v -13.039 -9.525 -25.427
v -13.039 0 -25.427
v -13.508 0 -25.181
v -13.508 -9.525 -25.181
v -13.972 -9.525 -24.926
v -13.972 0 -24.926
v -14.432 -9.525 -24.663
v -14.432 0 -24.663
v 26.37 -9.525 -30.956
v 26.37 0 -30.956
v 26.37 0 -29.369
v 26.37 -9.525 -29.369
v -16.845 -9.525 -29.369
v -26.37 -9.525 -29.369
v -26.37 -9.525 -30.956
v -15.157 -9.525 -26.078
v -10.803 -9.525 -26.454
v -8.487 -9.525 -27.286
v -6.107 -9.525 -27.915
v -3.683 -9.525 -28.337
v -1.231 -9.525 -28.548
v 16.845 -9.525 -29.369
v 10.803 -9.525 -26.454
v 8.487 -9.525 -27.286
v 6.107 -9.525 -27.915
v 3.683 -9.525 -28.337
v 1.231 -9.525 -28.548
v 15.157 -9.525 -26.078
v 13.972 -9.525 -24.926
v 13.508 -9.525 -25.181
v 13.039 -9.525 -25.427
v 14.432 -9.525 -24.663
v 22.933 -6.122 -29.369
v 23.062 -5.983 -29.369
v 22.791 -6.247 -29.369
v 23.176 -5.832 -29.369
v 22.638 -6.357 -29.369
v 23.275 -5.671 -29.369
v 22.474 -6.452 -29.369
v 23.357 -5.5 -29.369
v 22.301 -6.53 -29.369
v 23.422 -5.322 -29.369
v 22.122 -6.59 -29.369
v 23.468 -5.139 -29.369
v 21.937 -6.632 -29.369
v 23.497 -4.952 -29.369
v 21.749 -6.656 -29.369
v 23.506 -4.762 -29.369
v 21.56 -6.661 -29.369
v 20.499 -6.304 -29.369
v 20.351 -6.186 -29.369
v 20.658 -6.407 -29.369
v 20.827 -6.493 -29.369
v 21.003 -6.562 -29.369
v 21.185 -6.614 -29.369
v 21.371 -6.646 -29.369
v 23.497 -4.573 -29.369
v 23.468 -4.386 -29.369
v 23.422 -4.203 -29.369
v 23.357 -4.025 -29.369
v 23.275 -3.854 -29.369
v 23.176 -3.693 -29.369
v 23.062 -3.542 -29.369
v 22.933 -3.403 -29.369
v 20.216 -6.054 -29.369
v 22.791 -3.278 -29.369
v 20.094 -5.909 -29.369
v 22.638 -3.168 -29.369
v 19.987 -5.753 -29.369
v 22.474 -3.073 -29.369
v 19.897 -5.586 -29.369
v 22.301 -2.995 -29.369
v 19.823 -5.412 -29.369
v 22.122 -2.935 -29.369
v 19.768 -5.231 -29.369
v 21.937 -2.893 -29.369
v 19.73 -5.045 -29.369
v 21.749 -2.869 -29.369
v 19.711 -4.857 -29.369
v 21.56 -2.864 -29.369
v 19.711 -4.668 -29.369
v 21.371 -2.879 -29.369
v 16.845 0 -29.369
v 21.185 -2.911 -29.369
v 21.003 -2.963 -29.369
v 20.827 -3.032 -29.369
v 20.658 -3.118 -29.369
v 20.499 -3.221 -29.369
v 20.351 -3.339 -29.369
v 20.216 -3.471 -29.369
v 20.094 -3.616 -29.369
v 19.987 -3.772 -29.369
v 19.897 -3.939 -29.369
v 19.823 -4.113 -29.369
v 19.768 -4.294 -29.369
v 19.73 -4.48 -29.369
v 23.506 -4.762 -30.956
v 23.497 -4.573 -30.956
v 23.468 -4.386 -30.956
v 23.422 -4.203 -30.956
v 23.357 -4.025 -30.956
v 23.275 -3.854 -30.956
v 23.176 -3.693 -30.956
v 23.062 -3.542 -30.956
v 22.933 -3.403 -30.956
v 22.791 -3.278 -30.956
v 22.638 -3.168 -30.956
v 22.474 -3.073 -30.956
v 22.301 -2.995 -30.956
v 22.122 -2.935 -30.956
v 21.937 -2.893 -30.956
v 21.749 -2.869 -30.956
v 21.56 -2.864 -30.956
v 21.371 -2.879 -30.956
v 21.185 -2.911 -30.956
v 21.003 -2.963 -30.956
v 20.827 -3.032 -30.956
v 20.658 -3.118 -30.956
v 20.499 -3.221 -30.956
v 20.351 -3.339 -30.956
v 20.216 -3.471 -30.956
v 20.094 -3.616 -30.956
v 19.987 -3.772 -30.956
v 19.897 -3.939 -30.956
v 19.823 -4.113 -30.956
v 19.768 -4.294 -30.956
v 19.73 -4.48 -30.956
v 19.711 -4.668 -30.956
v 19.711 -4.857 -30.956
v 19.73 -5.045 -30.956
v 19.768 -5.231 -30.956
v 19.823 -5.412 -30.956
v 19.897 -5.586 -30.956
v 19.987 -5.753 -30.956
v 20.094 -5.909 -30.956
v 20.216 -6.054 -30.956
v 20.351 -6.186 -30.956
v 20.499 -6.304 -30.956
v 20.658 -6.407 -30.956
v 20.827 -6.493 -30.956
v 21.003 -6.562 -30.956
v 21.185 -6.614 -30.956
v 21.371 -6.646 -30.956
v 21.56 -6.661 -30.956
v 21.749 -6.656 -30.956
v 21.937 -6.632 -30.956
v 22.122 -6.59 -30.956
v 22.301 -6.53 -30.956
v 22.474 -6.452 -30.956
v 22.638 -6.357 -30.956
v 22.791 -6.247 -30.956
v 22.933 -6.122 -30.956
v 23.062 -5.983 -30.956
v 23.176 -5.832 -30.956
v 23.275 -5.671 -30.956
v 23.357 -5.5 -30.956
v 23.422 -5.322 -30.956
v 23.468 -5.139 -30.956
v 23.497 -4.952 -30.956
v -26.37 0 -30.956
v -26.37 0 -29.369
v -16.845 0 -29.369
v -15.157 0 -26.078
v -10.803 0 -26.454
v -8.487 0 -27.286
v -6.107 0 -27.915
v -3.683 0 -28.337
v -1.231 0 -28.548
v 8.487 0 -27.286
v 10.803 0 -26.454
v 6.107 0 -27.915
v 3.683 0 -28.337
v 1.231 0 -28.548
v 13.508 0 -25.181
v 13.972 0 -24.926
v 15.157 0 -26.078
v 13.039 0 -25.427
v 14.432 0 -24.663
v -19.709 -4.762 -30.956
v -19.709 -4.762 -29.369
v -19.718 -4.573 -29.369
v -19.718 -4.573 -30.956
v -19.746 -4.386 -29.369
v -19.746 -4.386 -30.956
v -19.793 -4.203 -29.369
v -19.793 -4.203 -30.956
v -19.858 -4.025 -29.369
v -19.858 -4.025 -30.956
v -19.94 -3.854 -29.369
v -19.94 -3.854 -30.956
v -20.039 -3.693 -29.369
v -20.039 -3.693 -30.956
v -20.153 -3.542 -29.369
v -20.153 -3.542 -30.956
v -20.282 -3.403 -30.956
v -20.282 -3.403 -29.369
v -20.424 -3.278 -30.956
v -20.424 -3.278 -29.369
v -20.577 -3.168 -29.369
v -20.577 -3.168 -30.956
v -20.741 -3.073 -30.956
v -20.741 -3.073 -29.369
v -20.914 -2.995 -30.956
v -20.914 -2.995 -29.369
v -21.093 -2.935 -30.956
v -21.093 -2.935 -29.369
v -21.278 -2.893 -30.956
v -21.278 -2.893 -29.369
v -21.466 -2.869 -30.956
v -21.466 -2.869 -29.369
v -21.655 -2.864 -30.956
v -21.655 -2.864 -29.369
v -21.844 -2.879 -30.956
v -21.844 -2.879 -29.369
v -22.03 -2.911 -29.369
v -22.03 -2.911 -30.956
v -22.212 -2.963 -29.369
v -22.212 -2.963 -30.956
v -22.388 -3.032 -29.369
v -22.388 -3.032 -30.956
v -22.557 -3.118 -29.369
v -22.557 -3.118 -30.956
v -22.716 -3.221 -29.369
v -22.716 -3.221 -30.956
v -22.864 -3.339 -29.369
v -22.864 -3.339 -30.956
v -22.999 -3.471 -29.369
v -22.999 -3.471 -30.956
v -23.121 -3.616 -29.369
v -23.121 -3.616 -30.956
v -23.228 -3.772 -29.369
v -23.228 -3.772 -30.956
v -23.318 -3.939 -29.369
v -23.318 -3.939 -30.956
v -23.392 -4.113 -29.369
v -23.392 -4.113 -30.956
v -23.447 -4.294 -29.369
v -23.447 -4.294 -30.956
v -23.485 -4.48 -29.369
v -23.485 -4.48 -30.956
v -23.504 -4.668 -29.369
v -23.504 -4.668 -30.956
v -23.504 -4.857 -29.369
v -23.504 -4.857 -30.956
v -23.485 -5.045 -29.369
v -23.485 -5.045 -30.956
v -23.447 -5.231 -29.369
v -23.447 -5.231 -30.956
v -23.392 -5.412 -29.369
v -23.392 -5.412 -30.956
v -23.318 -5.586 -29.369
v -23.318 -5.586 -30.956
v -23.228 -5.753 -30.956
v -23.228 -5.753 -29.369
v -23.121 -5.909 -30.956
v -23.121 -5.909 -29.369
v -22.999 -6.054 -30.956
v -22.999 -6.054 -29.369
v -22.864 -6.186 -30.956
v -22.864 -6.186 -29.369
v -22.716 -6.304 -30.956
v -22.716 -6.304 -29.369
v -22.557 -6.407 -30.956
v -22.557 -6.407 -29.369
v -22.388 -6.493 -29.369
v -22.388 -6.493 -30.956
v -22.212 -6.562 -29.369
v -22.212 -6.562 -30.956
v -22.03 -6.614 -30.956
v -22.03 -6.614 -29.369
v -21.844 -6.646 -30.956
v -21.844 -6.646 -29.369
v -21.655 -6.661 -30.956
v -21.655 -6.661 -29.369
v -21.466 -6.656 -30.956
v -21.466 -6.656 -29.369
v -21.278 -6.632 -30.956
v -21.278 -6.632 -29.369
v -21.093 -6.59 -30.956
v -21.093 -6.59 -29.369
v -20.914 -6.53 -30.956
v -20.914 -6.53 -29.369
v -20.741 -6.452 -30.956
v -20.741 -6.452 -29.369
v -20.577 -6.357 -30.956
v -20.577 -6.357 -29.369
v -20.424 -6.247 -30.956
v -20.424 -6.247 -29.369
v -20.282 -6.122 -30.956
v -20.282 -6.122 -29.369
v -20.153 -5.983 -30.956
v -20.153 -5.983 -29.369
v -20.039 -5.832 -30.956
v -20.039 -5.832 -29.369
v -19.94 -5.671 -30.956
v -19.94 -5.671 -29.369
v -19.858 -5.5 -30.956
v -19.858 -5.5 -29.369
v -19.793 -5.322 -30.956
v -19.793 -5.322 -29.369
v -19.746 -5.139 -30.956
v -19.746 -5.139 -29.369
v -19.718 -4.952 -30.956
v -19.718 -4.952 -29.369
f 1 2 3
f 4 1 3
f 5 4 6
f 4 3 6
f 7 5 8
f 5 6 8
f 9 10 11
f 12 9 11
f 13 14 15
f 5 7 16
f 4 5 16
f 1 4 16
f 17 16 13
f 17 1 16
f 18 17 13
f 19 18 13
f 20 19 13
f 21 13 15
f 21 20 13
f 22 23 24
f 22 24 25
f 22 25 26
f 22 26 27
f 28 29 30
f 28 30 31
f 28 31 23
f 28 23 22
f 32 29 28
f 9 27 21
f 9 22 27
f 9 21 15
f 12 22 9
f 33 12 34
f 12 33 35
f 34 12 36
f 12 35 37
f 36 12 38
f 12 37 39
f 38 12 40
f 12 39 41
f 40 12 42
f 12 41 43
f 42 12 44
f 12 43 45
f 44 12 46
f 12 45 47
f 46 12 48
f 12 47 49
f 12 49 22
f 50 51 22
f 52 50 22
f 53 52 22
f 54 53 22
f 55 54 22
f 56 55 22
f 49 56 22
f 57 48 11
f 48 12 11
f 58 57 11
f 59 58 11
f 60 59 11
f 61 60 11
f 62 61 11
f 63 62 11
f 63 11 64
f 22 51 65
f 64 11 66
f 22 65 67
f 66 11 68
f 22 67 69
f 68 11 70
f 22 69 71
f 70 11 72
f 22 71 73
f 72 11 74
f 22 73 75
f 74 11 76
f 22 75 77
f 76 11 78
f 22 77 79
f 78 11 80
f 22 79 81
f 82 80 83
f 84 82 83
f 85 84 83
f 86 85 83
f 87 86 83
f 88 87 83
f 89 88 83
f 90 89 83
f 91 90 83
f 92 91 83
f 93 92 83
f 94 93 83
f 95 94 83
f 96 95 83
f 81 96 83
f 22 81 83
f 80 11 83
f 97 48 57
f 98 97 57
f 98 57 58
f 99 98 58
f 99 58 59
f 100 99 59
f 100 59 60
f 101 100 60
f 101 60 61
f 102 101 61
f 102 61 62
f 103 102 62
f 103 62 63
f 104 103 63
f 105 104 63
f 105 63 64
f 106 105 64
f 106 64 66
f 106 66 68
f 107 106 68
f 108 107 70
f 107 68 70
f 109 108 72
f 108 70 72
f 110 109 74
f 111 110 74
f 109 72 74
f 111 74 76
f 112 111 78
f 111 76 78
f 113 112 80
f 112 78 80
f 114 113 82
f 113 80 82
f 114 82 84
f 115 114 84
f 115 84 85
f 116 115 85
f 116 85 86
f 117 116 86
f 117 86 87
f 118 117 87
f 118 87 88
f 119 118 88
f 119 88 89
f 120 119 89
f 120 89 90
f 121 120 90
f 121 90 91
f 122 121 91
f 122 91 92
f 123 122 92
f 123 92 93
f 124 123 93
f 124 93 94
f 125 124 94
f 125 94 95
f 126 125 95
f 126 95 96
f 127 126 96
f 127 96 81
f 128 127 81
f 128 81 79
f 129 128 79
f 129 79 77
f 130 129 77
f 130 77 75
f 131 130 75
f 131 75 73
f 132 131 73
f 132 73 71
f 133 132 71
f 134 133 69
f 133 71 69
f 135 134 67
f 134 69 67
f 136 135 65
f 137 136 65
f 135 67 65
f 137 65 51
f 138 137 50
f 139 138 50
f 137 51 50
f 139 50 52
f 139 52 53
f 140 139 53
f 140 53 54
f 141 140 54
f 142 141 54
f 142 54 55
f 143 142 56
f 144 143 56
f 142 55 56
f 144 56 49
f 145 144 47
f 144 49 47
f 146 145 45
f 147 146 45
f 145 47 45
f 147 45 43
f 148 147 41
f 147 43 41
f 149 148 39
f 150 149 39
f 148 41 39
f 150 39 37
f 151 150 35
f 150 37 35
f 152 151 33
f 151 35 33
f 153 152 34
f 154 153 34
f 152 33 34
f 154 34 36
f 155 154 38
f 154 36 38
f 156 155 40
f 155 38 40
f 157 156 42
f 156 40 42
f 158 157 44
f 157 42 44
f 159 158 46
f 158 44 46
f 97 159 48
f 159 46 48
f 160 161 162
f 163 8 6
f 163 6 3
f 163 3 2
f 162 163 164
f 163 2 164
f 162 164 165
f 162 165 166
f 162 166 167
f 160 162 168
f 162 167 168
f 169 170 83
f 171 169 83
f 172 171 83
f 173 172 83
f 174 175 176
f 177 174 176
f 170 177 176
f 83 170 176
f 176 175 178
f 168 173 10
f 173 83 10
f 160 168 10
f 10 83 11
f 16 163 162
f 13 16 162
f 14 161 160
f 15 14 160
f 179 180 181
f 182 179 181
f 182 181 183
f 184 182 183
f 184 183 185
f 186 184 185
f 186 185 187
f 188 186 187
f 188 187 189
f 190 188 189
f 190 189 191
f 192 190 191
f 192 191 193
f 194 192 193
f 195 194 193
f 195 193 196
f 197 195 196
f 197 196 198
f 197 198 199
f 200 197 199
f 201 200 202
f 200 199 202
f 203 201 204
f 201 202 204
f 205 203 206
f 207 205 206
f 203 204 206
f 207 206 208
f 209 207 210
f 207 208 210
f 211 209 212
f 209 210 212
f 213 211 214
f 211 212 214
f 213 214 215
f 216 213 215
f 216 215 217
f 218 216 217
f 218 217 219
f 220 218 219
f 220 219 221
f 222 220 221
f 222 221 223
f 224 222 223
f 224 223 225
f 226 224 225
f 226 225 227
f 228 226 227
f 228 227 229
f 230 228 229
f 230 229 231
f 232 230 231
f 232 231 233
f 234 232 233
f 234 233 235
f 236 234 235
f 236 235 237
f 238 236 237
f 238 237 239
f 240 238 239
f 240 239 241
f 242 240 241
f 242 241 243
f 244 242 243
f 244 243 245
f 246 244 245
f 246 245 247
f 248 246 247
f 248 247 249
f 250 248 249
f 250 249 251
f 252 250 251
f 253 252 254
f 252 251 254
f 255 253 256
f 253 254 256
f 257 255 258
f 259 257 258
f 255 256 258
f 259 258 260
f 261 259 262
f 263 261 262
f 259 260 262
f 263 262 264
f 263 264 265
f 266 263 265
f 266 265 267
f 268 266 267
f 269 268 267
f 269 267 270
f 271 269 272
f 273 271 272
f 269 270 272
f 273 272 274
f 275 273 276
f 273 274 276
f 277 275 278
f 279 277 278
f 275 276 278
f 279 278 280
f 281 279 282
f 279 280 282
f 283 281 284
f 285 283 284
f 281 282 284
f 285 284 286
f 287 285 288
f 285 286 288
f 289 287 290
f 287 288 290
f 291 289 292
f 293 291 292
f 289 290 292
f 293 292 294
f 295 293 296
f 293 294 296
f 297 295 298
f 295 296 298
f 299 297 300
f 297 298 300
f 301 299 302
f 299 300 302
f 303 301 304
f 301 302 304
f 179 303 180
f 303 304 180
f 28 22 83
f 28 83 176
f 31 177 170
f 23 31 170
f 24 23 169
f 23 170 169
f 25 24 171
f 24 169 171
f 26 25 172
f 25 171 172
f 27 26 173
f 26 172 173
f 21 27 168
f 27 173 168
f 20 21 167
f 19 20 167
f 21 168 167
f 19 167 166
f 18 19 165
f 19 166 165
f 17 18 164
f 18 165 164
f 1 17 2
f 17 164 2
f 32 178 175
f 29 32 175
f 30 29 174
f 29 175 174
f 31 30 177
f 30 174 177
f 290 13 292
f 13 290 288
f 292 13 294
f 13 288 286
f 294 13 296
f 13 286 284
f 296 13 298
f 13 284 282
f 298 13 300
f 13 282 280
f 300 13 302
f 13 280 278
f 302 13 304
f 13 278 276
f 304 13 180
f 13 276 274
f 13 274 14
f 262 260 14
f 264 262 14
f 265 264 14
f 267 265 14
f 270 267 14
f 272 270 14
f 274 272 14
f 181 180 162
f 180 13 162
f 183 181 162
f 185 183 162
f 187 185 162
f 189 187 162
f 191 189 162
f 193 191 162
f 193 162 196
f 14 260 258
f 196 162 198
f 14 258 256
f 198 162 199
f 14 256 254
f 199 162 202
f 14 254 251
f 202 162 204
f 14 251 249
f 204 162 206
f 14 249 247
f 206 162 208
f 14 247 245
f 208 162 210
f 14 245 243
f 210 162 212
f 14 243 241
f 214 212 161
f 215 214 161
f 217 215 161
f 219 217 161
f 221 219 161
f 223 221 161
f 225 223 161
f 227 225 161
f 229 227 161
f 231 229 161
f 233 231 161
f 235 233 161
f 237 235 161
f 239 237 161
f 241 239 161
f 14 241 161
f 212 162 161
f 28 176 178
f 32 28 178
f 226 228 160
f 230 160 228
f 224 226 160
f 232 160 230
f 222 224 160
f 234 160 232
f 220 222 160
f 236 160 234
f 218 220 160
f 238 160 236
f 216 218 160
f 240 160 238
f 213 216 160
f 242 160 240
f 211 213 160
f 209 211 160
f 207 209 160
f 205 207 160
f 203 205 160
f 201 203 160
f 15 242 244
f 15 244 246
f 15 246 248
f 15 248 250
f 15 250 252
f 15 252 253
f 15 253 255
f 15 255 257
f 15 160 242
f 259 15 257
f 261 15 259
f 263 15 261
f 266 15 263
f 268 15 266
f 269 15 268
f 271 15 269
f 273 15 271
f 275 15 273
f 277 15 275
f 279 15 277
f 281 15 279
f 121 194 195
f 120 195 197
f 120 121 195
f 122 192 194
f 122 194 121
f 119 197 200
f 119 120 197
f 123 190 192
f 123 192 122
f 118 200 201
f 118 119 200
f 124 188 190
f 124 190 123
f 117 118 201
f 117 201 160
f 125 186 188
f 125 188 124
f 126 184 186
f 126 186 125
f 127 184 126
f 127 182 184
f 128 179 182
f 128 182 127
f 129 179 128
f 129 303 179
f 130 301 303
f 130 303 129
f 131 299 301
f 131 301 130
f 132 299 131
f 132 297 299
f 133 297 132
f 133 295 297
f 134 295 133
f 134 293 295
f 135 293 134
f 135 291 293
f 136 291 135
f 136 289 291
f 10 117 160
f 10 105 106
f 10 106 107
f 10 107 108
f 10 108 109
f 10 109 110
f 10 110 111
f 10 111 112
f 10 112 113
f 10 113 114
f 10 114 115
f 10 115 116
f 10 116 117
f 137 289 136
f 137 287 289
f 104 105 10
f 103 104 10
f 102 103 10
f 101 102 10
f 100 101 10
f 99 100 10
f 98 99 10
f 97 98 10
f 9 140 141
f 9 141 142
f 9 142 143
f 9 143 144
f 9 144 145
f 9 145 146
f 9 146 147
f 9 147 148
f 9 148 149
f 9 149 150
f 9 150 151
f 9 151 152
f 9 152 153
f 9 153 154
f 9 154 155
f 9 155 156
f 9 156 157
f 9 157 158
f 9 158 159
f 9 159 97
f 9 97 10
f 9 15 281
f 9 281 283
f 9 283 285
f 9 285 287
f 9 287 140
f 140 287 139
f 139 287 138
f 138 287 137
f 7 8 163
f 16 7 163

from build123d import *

# Parameters (mm, degrees)
F1_DEPTH = 9.525
F2_R     = 1.89865
F3_DEPTH = 1.5885
F5_DEPTH = 9.525


with BuildPart() as f1:
    # F0 (on Front) → F1 (new body)
    with BuildSketch(Plane.XZ):
        with BuildLine():
            ThreePointArc((13.0392482051, -25.4265339999), (0, -28.575), (-13.0392482051, -25.4265339999))
            Line((-13.0392482051, -25.4265339999), (-13.7636508831, -26.8391192221))
            ThreePointArc((-13.7636508831, -26.8391192221), (0, -30.1625), (13.7636508831, -26.8391192221))
            Line((13.7636508831, -26.8391192221), (13.0392482051, -25.4265339999))
        make_face()
        with BuildLine():
            Line((15.157159657, -26.0775174697), (14.4316955802, -24.66286252))
            ThreePointArc((14.4316955802, -24.66286252), (13.7407782402, -25.0543736372), (13.0392482051, -25.4265339999))
            Line((13.0392482051, -25.4265339999), (13.7636508831, -26.8391192221))
            ThreePointArc((13.7636508831, -26.8391192221), (14.4654184136, -26.4674909345), (15.157159657, -26.0775174697))
        make_face()
        with BuildLine():
            Line((16.844971211, -29.36875), (15.157159657, -26.0775174697))
            ThreePointArc((15.157159657, -26.0775174697), (14.4654184136, -26.4674909345), (13.7636508831, -26.8391192221))
            Line((13.7636508831, -26.8391192221), (15.875, -30.95625))
            Line((15.875, -30.95625), (26.369971211, -30.95625))
            Line((26.369971211, -30.95625), (26.369971211, -29.36875))
            Line((26.369971211, -29.36875), (16.844971211, -29.36875))
        make_face()
        with BuildLine():
            ThreePointArc((-13.0392482051, -25.4265339999), (-13.7407782402, -25.0543736372), (-14.4316955802, -24.66286252))
            Line((-14.4316955802, -24.66286252), (-15.157159657, -26.0775174697))
            ThreePointArc((-15.157159657, -26.0775174697), (-14.4654184136, -26.4674909345), (-13.7636508831, -26.8391192221))
            Line((-13.7636508831, -26.8391192221), (-13.0392482051, -25.4265339999))
        make_face()
        with BuildLine():
            ThreePointArc((-13.7636508831, -26.8391192221), (-14.4654184136, -26.4674909345), (-15.157159657, -26.0775174697))
            Line((-15.157159657, -26.0775174697), (-16.844971211, -29.36875))
            Line((-16.844971211, -29.36875), (-26.369971211, -29.36875))
            Line((-26.369971211, -29.36875), (-26.369971211, -30.95625))
            Line((-26.369971211, -30.95625), (-15.875, -30.95625))
            Line((-15.875, -30.95625), (-13.7636508831, -26.8391192221))
        make_face()
    extrude(amount=F1_DEPTH)

    # F2 (on face) → F3 (cut, through all)
    with BuildSketch(Plane.XY.offset(-29.36875)):
        with Locations((21.607471211, -4.7625)):
            Circle(F2_R)
        with Locations((-21.607471211, -4.7625)):
            Circle(F2_R)
    extrude(amount=-F3_DEPTH, mode=Mode.SUBTRACT)

    # F4 (on face) → F5 (join, through all)
    with BuildSketch(Plane.XZ.offset(9.525)):
        with BuildLine():
            Line((-13.7636508831, -26.8391192221), (-15.875, -30.95625))
            Line((-15.875, -30.95625), (15.875, -30.95625))
            Line((15.875, -30.95625), (13.7636508831, -26.8391192221))
            ThreePointArc((13.7636508831, -26.8391192221), (0, -30.1625), (-13.7636508831, -26.8391192221))
        make_face()
    extrude(amount=-F5_DEPTH)


solid = f1.part
